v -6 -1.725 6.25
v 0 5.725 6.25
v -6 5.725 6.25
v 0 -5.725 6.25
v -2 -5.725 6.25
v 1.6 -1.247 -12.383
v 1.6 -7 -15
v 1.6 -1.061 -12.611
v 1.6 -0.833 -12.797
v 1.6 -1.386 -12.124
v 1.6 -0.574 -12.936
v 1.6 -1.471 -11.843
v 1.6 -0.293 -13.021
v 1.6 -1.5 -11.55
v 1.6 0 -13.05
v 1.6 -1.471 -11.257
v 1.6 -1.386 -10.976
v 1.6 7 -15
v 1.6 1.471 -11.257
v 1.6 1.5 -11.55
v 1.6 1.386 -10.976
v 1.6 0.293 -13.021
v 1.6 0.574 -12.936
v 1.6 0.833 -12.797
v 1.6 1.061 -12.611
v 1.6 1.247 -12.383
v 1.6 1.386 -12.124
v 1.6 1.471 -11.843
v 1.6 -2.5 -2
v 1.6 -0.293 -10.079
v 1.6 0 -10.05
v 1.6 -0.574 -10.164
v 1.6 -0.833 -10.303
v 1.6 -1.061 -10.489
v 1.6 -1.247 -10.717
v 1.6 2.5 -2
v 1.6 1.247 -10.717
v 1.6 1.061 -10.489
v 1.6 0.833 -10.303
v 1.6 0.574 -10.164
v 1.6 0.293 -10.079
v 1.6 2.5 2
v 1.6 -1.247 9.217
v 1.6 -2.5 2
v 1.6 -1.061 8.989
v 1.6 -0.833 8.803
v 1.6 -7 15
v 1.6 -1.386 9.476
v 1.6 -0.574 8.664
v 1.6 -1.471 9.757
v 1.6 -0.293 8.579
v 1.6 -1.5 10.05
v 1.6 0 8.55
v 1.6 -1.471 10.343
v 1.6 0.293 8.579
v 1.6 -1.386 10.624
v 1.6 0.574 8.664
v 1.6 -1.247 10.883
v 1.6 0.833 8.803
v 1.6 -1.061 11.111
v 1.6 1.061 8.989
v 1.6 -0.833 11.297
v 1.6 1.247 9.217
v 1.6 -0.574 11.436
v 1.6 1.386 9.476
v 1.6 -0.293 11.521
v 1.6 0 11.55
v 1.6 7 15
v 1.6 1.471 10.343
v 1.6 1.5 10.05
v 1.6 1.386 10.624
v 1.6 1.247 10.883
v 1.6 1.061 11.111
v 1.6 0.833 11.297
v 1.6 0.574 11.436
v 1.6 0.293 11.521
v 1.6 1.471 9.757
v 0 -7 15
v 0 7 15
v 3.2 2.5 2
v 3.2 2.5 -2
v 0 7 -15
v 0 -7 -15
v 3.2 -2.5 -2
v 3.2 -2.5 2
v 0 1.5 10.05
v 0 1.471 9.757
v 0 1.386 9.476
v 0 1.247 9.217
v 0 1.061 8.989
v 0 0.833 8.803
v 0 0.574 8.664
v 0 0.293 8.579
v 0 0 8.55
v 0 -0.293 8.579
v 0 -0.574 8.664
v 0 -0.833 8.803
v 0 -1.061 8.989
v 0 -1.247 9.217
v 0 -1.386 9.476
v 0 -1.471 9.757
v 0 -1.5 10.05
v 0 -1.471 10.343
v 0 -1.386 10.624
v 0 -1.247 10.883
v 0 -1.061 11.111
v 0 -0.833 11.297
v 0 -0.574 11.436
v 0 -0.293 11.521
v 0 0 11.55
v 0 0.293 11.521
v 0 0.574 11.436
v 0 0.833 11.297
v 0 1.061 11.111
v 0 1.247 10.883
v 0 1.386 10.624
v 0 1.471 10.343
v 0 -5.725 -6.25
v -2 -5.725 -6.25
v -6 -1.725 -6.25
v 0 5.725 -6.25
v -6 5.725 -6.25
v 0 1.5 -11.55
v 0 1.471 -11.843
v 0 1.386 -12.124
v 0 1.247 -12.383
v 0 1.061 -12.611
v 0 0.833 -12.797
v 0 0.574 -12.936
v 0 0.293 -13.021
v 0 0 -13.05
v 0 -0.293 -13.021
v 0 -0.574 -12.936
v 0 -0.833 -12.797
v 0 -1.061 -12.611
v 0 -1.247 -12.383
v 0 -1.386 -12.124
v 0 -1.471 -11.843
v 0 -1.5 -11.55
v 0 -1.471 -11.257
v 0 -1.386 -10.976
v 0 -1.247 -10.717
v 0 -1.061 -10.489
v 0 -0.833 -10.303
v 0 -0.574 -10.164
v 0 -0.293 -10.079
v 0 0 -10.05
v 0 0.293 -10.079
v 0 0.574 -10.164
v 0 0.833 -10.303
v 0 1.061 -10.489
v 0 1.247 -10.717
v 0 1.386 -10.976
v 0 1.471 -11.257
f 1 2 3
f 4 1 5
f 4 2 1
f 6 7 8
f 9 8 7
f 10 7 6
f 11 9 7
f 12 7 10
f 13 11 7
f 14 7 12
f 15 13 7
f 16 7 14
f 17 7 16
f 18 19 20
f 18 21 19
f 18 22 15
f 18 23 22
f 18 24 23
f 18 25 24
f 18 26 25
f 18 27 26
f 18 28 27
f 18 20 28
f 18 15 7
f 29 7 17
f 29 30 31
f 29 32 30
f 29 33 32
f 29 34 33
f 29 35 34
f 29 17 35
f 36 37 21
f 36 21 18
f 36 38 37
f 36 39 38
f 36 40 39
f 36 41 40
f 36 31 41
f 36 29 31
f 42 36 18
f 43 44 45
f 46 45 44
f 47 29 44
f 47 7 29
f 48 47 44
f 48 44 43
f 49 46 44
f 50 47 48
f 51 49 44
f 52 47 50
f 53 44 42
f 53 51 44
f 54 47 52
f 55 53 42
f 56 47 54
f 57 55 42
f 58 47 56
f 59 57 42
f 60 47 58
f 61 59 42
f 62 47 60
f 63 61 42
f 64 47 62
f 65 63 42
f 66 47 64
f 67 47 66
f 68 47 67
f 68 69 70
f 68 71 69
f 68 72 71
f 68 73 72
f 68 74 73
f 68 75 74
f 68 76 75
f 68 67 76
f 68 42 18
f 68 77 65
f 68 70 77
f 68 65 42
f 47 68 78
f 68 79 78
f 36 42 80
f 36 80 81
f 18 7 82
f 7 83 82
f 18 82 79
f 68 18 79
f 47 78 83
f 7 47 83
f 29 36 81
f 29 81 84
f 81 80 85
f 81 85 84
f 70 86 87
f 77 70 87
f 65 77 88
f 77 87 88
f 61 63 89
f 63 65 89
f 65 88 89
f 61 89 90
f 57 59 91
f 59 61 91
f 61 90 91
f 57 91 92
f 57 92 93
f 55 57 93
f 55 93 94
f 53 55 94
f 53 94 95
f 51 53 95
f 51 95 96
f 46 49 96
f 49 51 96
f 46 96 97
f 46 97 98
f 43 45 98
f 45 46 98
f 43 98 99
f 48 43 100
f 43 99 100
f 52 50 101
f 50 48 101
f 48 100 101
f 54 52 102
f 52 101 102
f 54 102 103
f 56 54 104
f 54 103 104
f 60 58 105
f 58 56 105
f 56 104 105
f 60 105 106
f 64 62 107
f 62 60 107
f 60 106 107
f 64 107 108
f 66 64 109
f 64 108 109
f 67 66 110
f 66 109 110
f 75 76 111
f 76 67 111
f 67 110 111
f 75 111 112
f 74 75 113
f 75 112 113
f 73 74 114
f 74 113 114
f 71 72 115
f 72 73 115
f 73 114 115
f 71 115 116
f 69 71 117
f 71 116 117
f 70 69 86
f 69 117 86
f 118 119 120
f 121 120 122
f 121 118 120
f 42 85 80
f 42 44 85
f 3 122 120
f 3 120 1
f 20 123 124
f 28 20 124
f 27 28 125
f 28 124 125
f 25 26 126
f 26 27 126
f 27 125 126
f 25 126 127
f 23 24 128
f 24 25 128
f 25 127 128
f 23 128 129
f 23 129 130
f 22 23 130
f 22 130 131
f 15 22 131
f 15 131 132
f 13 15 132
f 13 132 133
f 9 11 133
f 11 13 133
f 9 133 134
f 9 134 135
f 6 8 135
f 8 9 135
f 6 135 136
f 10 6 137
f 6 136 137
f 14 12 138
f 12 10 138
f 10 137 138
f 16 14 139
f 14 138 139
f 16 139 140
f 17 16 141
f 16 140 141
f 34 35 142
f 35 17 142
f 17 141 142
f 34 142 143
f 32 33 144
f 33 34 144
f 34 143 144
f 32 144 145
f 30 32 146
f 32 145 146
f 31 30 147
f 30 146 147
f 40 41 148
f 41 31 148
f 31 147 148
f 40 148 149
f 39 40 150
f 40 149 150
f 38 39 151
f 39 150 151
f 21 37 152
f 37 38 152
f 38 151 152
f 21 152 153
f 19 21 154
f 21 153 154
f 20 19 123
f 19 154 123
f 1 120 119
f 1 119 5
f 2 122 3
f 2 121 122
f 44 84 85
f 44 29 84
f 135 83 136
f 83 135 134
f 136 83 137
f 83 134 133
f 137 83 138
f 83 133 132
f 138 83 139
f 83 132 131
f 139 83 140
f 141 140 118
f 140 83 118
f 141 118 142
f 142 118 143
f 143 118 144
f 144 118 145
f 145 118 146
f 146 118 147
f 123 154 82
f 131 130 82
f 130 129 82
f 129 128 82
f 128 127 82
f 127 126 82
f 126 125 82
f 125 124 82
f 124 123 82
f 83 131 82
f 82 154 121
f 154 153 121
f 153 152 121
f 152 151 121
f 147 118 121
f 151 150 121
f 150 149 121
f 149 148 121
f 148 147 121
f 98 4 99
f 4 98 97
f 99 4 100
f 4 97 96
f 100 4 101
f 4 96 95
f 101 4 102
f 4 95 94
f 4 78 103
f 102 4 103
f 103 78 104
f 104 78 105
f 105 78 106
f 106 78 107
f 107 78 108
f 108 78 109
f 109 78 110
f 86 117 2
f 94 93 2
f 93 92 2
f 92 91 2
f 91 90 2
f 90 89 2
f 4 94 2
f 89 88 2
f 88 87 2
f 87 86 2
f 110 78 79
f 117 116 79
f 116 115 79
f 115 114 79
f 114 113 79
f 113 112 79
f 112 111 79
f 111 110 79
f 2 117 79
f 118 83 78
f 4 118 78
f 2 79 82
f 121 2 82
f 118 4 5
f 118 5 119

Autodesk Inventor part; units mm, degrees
ref_plane "YZ Plane" through (0, 0, 0) normal (1, 0, 0) x (0, 1, 0)
ref_plane "XZ Plane" through (0, 0, 0) normal (0, 1, 0) x (-1, 0, 0)
ref_plane "XY Plane" through (0, 0, 0) normal (0, 0, 1) x (1, 0, 0)
sketch "スケッチ1" plane through (0, 0, 0) normal (1, 0, 0) x (0, 1, 0)
  line L0 (7, 15) -> (-7, 15)
  line L1 (-7, 15) -> (-7, -15)
  line L2 (-7, -15) -> (7, -15)
  line L3 (7, -15) -> (7, 15)
  circle A0 centre (0, 10.05) radius 1.5
  circle A1 centre (0, -11.55) radius 1.5
  point P0 (0, 0)
  dimension "d0" = 14
  dimension "d1" = 30
  dimension "d2" = 7
  dimension "d3" = 15
  dimension "d4" = 3
  dimension "d5" = 3
  dimension "d6" = 3.45
  dimension "d7" = 3.45
extrude "押し出し1" add sketch "スケッチ1" along normal blind 1.6
sketch "スケッチ2" plane through (1.6, 0, 0) normal (1, 0, 0) x (0, 0, -1)
  line L0 (-2, 2.5) -> (2, 2.5)
  line L1 (2, 2.5) -> (2, -2.5)
  line L2 (2, -2.5) -> (-2, -2.5)
  line L3 (-2, -2.5) -> (-2, 2.5)
  point P0 (0, 0)
  dimension "d10" = 4
  dimension "d11" = 5
  dimension "d12" = 2.5
  dimension "d13" = 2
extrude "押し出し2" add sketch "スケッチ2" along normal blind 1.6
sketch "スケッチ3" plane through (0, 0, 0) normal (-1, 0, 0) x (0, 0, 1)
  line L0 (6.25, -5.725) -> (-6.25, -5.725)
  line L1 (-6.25, -5.725) -> (-6.25, 5.725)
  line L2 (-6.25, 5.725) -> (6.25, 5.725)
  line L3 (6.25, 5.725) -> (6.25, -5.725)
  line L4 (-15, -7) -> (-15, 7) projected
  line L5 (15, 7) -> (15, -7) projected
  point P0 (0, 0)
  dimension "d16" = 12.5
  dimension "d17" = 8.75
  dimension "d18" = 8.75
  dimension "d19" = 11.45
  dimension "d20" = 5.725
  dimension "d21" = 5.725
extrude "押し出し3" add sketch "スケッチ3" along normal blind 6
chamfer "面取り1" distance 4 angle 45 1 edges at (-6, -5.725, 0)
properties part number "encoder"
